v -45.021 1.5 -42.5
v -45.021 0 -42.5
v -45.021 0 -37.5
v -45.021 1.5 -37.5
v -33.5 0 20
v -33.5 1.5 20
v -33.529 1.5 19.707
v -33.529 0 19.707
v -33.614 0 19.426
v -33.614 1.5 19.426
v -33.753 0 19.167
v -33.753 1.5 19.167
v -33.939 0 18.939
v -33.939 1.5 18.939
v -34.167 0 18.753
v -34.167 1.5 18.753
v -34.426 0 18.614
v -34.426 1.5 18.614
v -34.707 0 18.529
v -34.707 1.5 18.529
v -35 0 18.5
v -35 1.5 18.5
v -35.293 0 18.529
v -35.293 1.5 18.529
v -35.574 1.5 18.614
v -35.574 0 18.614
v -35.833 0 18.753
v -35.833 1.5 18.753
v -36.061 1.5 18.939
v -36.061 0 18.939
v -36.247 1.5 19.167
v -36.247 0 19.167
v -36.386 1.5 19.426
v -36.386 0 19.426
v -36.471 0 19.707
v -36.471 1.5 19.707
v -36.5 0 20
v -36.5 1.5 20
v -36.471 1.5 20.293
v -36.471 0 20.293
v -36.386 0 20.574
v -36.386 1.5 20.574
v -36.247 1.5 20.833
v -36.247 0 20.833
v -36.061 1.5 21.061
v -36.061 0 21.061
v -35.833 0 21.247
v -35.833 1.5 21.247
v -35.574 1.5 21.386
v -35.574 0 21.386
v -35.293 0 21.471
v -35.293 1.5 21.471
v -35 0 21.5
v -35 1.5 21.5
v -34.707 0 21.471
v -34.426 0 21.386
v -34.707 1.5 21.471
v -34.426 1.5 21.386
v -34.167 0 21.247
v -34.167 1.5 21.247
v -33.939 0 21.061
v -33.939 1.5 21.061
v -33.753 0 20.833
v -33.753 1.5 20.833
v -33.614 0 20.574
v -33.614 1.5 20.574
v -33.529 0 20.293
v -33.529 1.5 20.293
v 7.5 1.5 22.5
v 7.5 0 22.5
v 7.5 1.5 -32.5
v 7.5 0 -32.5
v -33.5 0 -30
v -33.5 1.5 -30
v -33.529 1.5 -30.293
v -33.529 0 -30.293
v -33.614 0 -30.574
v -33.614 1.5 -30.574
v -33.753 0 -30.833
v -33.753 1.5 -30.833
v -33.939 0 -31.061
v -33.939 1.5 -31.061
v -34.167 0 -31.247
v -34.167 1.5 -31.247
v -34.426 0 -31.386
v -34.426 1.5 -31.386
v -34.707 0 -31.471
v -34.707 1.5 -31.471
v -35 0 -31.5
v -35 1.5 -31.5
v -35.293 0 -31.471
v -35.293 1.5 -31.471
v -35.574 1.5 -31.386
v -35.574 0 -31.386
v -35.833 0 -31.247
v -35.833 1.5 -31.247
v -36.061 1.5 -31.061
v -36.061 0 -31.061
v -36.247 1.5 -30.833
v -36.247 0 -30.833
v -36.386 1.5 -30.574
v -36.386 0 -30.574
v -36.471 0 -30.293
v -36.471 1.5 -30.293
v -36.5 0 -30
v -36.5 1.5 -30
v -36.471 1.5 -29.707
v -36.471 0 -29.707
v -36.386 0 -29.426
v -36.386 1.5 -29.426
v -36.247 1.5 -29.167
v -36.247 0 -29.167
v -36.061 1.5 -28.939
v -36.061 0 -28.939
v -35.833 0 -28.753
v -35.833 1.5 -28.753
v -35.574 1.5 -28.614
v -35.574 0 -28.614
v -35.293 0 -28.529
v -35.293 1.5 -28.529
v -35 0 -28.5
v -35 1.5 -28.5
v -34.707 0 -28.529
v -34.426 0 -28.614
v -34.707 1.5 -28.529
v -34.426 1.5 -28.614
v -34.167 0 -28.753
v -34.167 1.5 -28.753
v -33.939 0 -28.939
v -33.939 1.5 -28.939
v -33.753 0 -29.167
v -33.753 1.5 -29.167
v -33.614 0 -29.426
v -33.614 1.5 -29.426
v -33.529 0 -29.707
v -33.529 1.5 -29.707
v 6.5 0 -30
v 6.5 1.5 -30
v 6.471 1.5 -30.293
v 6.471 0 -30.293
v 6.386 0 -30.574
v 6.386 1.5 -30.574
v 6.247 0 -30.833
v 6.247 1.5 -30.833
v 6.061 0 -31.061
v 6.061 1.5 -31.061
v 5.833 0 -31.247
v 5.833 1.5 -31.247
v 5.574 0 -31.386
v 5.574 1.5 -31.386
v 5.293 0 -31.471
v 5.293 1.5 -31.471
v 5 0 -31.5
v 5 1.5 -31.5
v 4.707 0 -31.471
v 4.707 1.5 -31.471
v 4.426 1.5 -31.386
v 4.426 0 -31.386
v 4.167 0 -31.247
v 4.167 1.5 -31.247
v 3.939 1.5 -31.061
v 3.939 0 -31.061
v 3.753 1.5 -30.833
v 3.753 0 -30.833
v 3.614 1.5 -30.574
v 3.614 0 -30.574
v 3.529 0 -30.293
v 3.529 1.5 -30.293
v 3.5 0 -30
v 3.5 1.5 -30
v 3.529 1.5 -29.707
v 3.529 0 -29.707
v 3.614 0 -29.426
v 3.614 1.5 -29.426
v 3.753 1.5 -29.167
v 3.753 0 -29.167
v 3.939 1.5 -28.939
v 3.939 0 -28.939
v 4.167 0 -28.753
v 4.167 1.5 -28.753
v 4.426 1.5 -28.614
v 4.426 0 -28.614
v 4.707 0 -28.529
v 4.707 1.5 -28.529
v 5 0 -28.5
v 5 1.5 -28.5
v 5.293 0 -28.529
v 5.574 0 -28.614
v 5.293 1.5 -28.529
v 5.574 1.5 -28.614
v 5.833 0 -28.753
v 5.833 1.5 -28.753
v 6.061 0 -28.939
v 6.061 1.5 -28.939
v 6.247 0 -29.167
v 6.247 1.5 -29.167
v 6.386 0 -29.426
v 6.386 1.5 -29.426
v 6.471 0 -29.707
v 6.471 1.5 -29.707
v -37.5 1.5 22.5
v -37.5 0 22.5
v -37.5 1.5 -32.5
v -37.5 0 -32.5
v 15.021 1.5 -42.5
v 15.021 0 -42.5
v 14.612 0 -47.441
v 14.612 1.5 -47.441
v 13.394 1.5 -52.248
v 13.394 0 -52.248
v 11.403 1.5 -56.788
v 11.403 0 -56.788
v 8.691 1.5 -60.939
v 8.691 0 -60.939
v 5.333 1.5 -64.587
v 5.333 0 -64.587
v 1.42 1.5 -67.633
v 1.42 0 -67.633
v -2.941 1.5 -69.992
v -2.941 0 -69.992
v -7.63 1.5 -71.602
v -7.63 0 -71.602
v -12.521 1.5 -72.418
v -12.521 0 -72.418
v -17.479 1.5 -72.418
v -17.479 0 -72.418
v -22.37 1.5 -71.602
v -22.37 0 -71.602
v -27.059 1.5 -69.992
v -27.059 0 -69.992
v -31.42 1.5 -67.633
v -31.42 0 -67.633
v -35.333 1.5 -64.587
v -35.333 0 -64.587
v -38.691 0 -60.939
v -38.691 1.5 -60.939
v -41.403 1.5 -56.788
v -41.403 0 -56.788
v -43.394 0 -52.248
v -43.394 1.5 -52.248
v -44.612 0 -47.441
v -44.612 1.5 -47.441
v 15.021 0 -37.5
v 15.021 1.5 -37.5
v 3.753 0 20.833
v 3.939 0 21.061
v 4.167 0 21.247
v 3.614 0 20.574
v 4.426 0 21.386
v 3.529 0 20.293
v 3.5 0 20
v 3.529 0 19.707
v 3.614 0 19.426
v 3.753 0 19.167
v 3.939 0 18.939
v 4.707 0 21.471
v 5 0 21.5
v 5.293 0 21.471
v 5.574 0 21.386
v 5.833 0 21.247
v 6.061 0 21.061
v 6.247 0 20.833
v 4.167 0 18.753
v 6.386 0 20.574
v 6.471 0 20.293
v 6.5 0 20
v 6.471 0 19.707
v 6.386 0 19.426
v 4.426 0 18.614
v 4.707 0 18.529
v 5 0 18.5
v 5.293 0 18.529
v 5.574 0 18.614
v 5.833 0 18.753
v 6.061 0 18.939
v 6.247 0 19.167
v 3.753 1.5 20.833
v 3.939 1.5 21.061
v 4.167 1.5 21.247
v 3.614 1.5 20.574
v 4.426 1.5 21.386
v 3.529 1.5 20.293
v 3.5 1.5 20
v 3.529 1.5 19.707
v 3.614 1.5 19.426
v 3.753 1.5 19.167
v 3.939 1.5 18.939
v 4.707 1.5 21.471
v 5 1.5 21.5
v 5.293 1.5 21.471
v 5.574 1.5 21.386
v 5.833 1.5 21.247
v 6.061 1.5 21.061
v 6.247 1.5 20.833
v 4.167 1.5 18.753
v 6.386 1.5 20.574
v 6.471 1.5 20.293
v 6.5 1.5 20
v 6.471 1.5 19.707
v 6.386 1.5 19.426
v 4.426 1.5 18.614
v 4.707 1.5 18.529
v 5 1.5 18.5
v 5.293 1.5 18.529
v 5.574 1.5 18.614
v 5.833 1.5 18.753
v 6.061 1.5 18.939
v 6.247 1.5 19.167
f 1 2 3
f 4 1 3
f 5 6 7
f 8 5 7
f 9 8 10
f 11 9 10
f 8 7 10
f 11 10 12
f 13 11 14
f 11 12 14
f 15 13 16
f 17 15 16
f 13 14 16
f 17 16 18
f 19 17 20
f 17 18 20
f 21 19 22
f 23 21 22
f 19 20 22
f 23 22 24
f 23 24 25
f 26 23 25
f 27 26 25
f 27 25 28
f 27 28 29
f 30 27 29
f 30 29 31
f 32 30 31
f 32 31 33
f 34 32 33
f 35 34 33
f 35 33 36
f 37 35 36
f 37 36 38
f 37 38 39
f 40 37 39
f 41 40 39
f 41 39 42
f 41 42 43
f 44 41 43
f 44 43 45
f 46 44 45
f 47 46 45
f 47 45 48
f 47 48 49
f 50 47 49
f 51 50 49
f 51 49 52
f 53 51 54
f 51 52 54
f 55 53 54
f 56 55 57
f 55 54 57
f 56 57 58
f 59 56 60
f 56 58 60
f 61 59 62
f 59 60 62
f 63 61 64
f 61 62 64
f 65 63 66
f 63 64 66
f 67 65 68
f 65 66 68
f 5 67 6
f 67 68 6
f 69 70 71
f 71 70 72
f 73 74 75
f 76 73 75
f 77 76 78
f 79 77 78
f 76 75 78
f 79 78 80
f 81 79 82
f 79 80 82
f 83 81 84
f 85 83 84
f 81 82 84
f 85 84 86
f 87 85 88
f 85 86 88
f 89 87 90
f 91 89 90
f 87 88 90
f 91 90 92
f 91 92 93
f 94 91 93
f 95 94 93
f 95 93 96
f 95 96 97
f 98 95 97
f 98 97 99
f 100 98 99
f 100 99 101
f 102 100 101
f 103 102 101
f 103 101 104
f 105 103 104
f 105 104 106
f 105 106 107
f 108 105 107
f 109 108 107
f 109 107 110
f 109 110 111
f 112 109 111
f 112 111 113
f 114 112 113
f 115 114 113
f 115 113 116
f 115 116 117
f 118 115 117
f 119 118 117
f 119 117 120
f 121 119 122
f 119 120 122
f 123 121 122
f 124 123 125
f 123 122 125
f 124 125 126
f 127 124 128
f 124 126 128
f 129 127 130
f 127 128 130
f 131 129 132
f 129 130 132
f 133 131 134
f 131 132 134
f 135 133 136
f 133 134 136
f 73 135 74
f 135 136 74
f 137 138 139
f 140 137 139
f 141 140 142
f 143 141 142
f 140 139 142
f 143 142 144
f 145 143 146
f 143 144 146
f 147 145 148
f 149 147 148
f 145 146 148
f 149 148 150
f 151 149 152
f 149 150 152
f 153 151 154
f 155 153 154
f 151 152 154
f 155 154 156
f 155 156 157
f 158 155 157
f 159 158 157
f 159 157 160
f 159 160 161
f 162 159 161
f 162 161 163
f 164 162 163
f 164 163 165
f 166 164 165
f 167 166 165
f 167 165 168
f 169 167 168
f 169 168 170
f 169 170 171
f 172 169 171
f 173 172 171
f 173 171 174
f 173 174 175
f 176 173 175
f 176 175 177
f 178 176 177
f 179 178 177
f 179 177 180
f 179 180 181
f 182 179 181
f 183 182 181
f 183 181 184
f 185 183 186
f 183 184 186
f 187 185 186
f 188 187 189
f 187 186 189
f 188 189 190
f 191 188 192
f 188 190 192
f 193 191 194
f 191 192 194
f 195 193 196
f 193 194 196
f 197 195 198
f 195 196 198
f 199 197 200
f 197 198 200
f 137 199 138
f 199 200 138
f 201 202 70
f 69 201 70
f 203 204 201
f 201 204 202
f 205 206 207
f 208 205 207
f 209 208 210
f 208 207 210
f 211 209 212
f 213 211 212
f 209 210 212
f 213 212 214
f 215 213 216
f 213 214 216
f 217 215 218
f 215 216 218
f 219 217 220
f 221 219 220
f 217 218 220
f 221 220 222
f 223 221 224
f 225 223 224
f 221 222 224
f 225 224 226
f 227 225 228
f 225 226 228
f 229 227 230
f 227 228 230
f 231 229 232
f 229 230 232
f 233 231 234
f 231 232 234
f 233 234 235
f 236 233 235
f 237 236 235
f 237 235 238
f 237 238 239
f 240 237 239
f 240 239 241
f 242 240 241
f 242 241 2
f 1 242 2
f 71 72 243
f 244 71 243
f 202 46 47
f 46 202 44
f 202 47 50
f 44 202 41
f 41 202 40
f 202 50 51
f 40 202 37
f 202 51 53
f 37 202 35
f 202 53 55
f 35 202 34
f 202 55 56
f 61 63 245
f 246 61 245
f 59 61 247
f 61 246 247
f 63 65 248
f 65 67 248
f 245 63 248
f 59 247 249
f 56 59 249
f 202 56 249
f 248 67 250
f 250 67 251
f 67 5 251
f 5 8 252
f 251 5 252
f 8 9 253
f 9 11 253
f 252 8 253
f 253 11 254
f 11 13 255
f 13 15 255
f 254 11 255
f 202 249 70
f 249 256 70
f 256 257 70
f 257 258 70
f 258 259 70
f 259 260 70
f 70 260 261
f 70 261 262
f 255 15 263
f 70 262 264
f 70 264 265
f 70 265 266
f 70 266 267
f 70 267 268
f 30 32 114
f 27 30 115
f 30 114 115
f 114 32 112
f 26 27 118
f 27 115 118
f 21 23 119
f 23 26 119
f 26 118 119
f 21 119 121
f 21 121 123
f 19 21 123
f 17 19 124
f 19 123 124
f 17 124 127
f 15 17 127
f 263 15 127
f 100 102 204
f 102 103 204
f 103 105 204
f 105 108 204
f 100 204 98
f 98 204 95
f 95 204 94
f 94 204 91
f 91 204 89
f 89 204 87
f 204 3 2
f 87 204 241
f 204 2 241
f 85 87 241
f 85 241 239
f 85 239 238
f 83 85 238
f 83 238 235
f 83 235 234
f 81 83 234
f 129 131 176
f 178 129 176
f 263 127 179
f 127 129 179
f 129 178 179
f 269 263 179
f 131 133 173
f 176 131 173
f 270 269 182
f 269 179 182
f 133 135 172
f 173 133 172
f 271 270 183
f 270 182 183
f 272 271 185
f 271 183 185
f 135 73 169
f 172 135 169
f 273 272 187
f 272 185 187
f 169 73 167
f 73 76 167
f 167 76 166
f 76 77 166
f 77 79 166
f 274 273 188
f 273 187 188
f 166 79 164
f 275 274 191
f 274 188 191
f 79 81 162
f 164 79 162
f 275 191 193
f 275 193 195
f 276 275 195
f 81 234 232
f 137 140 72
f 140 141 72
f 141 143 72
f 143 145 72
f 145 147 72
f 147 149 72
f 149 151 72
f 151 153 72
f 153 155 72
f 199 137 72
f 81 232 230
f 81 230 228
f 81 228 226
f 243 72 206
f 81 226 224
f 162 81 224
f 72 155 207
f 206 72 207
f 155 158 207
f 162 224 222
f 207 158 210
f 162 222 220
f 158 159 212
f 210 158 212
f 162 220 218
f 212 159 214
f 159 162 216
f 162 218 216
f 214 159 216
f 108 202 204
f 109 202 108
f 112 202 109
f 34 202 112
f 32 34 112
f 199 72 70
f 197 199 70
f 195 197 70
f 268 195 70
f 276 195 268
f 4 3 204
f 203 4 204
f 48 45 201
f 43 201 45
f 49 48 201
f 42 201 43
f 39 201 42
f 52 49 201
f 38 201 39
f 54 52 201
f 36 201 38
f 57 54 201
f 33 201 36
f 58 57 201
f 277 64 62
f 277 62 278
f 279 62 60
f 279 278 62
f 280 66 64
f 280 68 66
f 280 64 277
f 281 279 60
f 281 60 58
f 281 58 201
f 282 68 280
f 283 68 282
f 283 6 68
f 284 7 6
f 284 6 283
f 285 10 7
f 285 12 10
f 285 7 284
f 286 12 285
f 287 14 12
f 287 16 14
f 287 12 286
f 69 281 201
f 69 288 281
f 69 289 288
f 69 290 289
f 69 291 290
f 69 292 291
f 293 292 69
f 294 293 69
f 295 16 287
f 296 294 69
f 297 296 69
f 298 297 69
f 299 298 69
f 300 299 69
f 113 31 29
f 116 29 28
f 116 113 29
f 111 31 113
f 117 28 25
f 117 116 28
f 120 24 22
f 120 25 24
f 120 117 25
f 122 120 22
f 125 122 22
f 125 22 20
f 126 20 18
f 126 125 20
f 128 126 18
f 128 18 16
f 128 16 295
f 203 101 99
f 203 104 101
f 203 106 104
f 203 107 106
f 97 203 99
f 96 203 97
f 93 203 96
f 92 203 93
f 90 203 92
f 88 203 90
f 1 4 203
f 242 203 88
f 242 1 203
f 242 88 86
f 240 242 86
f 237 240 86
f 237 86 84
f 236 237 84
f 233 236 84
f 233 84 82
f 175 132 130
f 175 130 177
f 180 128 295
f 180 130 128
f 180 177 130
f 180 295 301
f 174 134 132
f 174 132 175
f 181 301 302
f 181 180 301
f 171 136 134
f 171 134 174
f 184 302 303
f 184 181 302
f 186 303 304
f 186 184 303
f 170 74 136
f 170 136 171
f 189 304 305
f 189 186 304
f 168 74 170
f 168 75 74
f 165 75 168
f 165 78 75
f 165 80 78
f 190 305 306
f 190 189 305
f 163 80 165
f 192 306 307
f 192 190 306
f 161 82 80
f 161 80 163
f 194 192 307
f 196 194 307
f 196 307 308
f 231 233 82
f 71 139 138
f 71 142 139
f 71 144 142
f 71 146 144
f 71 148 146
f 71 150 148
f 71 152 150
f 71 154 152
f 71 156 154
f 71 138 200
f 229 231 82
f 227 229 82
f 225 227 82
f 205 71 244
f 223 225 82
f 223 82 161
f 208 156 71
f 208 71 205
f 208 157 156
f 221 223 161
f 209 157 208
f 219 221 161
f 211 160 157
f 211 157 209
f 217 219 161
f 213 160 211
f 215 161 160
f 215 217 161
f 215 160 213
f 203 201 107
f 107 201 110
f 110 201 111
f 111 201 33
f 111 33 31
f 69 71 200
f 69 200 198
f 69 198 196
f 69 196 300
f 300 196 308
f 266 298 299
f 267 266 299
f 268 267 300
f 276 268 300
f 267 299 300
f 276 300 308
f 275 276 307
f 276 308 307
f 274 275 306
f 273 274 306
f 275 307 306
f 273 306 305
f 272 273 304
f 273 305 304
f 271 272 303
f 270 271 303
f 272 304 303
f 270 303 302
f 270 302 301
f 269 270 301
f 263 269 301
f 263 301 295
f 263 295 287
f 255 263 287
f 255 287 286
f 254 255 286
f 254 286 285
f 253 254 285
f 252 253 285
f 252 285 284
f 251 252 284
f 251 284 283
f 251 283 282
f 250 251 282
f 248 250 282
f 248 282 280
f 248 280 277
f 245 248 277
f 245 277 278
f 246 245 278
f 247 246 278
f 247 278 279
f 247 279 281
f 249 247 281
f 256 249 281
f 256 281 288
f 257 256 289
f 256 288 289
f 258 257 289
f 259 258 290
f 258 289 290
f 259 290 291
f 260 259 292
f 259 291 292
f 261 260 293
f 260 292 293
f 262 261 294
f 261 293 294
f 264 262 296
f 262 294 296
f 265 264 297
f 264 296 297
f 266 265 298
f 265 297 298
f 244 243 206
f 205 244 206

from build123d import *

# Parameters (mm, degrees)
BOSS_EXTRUDE1_DEPTH = 1.5
SKETCH2_R           = 1.5
CUT_EXTRUDE1_DEPTH  = 2.5


with BuildPart() as part:
    # Sketch1 → Boss-Extrude1 (new body)
    with BuildSketch(Plane(origin=(0, 0, 0), x_dir=(1, 0, 0), z_dir=(0, 1, 0))):
        with BuildLine():
            Line((-45.021006533, 42.5), (-45.021006533, 37.5))
            Line((-45.021006533, 37.5), (-37.5, 32.5))
            Line((-37.5, 32.5), (-37.5, -22.5))
            Line((-37.5, -22.5), (7.5, -22.5))
            Line((7.5, -22.5), (7.5, 32.5))
            Line((7.5, 32.5), (15.021006533, 37.5))
            Line((15.021006533, 37.5), (15.021006533, 42.5))
            ThreePointArc((15.021006533, 42.5), (-15, 72.521006533), (-45.021006533, 42.5))
        make_face()
    extrude(amount=BOSS_EXTRUDE1_DEPTH)

    # Sketch2 → Cut-Extrude1 (cut, through all)
    with BuildSketch(Plane(origin=(0, 1.5, 0), x_dir=(1, 0, 0), z_dir=(0, 1, 0))):
        with Locations((-35, 30)):
            Circle(SKETCH2_R)
        with Locations((-35, -20)):
            Circle(SKETCH2_R)
        with Locations((5, -20)):
            Circle(SKETCH2_R)
        with Locations((5, 30)):
            Circle(SKETCH2_R)
    extrude(amount=-CUT_EXTRUDE1_DEPTH, mode=Mode.SUBTRACT)


solid = part.part
